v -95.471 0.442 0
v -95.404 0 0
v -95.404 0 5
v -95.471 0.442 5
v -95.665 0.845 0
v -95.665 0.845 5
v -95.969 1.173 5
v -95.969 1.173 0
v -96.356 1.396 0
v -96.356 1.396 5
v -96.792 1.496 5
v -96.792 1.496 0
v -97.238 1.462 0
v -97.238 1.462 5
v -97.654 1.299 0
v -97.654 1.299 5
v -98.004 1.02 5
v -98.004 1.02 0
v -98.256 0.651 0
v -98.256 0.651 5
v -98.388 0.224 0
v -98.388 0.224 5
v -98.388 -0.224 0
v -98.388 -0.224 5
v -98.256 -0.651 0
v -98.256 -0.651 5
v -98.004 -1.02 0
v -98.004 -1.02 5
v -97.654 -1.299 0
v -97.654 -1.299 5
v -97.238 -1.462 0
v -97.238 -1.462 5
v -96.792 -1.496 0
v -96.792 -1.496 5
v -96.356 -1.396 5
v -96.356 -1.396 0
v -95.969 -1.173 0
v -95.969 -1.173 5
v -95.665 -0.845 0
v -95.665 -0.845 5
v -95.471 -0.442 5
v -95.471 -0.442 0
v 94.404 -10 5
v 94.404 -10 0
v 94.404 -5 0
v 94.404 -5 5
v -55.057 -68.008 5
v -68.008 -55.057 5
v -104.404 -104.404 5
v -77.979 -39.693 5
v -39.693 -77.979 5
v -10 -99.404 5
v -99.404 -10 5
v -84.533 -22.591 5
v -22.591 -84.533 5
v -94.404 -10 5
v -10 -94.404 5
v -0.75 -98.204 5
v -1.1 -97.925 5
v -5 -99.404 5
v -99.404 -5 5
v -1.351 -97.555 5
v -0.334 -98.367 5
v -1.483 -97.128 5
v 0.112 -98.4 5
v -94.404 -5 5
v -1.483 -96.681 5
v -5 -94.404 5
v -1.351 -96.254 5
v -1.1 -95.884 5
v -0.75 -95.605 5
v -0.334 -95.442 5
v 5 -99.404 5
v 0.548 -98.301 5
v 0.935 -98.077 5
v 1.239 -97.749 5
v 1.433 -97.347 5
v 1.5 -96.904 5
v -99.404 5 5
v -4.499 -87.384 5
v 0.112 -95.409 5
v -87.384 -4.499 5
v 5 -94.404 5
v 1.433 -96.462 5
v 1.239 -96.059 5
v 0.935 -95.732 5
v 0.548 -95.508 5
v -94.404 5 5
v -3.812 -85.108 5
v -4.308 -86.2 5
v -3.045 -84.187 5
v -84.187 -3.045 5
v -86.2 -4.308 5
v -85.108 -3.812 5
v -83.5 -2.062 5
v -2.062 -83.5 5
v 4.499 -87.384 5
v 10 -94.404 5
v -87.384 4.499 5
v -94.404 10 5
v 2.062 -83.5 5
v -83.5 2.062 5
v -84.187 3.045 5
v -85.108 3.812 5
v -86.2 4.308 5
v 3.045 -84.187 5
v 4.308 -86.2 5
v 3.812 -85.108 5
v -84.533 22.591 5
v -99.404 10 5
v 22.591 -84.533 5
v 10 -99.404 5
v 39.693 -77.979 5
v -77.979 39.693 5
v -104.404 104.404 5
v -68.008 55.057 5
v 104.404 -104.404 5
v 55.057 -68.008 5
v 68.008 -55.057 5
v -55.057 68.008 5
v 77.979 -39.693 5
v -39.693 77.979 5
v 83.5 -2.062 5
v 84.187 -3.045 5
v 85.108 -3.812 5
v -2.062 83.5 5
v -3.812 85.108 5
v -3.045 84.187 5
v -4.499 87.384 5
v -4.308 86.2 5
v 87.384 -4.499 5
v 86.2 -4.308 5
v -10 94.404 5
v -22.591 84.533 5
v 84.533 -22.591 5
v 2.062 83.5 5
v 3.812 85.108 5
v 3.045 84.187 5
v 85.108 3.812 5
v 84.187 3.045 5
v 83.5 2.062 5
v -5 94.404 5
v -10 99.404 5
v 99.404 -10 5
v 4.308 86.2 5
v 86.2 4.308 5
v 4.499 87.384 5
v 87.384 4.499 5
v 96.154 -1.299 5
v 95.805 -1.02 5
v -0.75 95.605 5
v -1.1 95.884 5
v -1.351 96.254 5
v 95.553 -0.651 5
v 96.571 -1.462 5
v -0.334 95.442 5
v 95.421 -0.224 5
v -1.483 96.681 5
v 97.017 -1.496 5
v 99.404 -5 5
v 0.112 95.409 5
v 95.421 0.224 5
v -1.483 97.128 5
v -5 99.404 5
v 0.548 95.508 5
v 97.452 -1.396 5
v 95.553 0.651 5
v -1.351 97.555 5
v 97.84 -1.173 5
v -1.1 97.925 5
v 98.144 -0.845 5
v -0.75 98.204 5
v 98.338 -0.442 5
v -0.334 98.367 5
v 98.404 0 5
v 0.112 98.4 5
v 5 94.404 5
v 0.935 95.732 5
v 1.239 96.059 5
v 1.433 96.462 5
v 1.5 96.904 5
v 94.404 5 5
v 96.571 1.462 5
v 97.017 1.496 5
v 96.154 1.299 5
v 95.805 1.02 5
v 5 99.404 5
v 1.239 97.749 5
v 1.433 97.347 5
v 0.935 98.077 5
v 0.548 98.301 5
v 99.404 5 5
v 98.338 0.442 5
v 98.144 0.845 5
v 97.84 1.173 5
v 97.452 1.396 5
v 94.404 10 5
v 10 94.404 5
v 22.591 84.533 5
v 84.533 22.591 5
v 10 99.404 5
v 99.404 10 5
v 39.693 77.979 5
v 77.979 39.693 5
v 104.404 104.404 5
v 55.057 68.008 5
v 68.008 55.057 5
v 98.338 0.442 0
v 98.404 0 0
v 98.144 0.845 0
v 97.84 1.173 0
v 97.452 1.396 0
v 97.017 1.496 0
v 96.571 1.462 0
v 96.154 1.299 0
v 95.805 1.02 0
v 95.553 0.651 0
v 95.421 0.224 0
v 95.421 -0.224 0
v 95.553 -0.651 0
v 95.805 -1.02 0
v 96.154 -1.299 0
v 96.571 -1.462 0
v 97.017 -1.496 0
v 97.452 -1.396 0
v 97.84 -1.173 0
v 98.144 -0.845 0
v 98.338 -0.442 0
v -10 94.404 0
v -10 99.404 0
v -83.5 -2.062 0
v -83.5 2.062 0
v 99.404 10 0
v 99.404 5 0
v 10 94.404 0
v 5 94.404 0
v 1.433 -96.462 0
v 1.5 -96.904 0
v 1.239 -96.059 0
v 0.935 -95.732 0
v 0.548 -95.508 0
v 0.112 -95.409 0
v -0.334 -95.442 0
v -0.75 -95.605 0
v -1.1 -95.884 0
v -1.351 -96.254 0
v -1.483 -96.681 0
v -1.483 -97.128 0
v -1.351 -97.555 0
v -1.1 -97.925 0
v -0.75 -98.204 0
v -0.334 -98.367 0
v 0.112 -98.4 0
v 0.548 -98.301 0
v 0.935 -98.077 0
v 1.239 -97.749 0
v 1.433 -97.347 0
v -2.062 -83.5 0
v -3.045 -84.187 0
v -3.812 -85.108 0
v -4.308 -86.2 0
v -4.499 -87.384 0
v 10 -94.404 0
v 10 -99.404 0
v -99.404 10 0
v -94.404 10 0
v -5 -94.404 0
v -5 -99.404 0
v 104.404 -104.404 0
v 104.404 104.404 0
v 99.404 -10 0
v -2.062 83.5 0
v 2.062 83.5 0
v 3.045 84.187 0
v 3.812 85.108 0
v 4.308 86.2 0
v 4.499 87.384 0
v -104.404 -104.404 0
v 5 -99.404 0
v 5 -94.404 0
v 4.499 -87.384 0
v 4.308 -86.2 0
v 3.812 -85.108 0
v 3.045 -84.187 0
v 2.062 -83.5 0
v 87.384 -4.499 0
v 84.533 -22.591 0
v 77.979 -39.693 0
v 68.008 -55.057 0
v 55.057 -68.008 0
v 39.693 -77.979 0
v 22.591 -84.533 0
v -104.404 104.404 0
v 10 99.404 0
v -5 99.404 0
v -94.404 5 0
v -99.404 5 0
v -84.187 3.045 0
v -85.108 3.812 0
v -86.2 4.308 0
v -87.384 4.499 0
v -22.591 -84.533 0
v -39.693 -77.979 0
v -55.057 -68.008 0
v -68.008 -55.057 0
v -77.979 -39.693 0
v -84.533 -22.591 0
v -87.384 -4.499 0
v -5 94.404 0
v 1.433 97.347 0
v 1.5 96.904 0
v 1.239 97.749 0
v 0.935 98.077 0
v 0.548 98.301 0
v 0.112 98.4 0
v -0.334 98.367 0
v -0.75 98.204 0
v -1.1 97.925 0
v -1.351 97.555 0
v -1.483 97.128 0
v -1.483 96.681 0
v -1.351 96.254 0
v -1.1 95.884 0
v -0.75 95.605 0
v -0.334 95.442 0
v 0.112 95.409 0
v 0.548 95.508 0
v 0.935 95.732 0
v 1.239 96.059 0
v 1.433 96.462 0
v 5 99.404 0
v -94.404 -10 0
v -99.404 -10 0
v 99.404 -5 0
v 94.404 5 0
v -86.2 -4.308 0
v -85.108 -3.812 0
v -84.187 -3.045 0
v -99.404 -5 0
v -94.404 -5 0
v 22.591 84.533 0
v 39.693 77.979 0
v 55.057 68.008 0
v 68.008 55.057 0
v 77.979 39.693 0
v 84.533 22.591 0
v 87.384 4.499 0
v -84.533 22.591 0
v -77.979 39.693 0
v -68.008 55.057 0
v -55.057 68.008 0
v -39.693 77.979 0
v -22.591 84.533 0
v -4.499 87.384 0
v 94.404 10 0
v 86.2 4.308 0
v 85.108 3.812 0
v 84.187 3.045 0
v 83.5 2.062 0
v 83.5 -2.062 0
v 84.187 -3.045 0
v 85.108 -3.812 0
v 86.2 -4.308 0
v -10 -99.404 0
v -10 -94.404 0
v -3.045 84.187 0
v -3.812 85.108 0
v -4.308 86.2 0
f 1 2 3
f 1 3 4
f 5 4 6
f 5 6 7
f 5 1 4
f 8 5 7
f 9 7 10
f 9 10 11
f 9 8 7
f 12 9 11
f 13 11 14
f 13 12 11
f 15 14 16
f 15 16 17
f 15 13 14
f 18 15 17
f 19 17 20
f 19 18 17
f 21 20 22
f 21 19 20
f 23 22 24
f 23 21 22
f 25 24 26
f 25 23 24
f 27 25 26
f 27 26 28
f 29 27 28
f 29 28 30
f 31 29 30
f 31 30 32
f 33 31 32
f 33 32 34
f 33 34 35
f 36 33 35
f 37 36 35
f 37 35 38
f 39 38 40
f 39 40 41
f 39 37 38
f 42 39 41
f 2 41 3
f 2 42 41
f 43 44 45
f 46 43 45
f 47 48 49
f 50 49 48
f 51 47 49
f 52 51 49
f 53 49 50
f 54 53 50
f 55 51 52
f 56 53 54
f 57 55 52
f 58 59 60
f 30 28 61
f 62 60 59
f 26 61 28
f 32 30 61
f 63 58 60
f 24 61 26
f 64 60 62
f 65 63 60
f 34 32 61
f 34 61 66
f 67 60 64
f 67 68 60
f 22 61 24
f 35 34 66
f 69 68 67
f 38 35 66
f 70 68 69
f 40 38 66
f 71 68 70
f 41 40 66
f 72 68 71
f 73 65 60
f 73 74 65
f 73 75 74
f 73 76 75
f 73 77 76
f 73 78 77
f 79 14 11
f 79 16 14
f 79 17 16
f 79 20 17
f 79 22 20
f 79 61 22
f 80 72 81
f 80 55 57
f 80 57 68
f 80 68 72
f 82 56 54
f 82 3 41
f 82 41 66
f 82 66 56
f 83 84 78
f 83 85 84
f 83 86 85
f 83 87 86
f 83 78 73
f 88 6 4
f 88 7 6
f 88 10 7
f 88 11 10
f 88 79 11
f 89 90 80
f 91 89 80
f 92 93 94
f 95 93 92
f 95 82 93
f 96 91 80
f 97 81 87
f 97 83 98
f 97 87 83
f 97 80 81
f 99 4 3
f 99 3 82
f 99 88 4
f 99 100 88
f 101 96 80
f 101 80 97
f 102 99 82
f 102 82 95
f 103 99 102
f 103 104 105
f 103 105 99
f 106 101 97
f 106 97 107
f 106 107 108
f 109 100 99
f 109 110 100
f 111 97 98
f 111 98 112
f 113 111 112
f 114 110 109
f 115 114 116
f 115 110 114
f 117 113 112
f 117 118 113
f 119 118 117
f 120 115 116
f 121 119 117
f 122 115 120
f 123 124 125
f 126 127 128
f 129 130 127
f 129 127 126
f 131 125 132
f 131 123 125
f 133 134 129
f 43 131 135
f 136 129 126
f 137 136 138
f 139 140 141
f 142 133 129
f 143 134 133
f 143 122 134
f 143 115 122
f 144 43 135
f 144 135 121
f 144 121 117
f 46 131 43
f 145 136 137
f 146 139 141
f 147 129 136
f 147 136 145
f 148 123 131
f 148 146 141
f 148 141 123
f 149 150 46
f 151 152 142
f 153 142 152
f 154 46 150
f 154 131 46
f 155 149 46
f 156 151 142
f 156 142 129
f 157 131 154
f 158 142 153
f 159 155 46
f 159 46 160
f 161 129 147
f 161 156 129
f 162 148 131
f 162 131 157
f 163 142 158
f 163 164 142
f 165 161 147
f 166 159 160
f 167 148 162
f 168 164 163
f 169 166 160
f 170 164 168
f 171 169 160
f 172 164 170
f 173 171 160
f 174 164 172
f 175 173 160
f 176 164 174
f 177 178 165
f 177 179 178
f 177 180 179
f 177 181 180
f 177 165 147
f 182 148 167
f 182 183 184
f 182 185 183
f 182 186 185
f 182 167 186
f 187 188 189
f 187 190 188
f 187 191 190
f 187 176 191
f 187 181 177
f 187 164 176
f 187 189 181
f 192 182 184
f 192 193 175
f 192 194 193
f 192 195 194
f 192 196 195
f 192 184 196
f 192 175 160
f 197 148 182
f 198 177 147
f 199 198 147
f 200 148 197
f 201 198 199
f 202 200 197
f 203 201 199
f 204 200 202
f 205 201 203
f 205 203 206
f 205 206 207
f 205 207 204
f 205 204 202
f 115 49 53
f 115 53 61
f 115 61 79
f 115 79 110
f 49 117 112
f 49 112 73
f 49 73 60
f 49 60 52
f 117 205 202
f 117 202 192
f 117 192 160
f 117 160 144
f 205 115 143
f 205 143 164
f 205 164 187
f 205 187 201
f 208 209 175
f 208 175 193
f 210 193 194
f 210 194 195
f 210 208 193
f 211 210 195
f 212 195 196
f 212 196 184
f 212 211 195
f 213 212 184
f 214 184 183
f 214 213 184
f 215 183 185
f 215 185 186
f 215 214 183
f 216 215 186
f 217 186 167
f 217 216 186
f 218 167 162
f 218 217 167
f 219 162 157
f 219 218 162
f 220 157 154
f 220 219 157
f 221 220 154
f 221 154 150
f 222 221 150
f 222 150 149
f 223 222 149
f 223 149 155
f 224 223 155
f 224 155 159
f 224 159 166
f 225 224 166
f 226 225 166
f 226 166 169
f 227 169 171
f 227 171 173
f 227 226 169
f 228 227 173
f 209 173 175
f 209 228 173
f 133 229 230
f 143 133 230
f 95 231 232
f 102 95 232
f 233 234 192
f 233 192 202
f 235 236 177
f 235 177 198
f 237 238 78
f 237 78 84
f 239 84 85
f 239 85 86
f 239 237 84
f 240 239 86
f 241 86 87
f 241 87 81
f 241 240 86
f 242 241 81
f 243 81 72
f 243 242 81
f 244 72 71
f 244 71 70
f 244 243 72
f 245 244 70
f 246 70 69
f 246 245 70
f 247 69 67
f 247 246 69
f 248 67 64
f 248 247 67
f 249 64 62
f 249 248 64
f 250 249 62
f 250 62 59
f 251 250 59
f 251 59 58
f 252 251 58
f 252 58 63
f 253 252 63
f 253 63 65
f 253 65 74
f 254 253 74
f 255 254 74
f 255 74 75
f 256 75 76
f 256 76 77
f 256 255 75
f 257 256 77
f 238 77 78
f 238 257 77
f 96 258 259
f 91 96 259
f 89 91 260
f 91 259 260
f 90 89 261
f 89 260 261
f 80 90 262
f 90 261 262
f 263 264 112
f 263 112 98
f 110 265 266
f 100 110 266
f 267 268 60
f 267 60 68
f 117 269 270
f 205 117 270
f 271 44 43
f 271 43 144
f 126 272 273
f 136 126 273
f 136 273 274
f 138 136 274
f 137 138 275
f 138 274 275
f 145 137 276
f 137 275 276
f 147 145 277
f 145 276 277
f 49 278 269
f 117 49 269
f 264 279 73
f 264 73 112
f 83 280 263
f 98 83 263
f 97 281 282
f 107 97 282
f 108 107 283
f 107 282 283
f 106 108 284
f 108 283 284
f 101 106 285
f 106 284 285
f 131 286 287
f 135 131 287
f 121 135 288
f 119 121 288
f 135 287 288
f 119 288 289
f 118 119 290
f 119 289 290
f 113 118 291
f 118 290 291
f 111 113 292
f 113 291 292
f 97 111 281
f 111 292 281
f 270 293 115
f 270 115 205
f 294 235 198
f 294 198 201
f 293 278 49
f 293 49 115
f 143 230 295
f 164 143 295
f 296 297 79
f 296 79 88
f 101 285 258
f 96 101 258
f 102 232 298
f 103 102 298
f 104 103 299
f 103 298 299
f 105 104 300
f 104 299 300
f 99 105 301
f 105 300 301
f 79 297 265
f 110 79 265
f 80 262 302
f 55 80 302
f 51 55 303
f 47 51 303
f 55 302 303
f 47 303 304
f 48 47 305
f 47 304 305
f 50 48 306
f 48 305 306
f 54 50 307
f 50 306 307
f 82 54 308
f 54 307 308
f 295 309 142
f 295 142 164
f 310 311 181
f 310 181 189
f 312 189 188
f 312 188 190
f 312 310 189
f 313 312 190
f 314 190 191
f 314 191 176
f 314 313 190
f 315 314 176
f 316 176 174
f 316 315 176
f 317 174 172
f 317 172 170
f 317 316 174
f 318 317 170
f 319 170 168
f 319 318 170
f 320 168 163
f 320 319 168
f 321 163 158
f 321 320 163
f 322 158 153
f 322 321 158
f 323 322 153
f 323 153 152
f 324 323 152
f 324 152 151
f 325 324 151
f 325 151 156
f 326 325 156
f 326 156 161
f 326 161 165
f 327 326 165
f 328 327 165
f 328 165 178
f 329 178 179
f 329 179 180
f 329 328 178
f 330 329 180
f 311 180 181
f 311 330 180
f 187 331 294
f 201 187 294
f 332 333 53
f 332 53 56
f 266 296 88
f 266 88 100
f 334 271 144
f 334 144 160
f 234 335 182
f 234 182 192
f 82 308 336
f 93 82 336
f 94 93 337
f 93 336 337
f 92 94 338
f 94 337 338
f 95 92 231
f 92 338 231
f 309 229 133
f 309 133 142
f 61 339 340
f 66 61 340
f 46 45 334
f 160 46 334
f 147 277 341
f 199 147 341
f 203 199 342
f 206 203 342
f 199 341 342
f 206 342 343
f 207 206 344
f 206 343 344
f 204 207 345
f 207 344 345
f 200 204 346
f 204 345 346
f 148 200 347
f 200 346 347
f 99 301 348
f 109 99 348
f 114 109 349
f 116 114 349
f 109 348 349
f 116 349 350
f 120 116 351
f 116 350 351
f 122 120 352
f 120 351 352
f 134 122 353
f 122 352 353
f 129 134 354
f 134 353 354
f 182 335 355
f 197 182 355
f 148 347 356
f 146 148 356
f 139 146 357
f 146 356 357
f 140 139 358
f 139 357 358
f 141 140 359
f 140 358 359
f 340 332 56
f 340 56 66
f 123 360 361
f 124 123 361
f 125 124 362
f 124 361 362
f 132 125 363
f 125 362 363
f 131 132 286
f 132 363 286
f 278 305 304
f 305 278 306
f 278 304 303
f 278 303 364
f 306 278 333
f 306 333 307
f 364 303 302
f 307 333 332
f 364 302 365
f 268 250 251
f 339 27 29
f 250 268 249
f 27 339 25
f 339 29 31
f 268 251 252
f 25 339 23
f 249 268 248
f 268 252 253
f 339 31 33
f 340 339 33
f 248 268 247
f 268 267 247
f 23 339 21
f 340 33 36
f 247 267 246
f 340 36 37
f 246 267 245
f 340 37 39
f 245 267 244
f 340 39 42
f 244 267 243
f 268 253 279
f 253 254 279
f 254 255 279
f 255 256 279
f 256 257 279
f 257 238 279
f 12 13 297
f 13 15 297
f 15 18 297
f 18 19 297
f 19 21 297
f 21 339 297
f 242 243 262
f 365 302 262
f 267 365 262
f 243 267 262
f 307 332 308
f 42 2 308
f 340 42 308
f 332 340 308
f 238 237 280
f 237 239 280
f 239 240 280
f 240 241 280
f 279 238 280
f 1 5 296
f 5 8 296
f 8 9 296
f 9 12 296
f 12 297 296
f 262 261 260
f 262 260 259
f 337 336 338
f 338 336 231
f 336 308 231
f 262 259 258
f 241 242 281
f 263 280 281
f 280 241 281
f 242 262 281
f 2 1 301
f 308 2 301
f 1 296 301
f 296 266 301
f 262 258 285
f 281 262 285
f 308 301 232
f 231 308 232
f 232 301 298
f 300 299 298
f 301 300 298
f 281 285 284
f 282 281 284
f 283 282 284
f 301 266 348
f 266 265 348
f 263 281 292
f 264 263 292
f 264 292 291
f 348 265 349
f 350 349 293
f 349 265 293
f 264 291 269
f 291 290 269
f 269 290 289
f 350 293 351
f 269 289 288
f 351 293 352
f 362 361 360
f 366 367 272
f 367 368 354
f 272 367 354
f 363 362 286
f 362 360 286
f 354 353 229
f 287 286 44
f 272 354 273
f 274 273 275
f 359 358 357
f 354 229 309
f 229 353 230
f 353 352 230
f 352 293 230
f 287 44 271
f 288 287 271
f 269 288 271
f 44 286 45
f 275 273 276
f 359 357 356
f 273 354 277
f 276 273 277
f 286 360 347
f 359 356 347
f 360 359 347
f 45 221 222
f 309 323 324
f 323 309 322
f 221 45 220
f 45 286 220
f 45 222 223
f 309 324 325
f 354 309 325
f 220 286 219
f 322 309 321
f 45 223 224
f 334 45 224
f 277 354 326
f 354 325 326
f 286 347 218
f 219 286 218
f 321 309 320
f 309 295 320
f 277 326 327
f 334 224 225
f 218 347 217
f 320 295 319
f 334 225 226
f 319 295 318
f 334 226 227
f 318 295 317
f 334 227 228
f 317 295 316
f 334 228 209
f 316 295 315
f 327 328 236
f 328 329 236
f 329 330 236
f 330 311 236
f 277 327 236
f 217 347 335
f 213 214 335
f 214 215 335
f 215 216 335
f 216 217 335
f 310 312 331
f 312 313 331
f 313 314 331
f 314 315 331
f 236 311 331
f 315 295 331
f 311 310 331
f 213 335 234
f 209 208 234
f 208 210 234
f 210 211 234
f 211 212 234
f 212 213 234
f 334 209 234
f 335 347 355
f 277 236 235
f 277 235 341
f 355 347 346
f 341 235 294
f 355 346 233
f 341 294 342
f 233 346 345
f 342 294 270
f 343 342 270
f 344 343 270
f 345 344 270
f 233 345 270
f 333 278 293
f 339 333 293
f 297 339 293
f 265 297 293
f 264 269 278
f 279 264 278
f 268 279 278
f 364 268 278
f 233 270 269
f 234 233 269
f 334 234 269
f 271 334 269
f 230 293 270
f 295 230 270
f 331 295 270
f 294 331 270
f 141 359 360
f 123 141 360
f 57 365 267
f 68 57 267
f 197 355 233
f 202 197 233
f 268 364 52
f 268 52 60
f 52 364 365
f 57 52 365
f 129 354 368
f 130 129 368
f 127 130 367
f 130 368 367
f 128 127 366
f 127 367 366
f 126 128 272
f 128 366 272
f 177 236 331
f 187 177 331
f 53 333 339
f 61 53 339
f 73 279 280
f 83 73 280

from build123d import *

# Parameters (mm, degrees)
BOSS_EXTRU_1_DEPTH = 5
BOSS_EXTRU_2_START = -5
ESQUISSE2_W        = 208.80895352
ESQUISSE2_H        = 208.80895352
ESQUISSE2_R        = 87.5
ESQUISSE2_R_2      = 1.5
ESQUISSE2_W_2      = 5
ESQUISSE2_H_2      = 5
BOSS_EXTRU_2_DEPTH = 5


# Read off the part's stored shape, not the designer's step: Boss.-Extru.1
with BuildPart() as part:
    # Boss.-Extru.1 outline → Boss.-Extru.1 (new body)
    with BuildSketch(Plane.XY):
        with BuildLine():
            Line((-15, 94.40447676), (-15, 99.40447676))
            Line((-15, 99.40447676), (-25, 99.40447676))
            ThreePointArc((-25, 99.40447676), (-72.478445072, 72.478445072), (-99.40447676, 25))
            Line((-99.40447676, 25), (-99.40447676, 15))
            Line((-99.40447676, 15), (-94.40447676, 15))
            Line((-94.40447676, 15), (-94.40447676, -15))
            Line((-94.40447676, -15), (-99.40447676, -15))
            Line((-99.40447676, -15), (-99.40447676, -25))
            ThreePointArc((-99.40447676, -25), (-72.478445072, -72.478445072), (-25, -99.40447676))
            Line((-25, -99.40447676), (-15, -99.40447676))
            Line((-15, -99.40447676), (-15, -94.40447676))
            Line((-15, -94.40447676), (15, -94.40447676))
            Line((15, -94.40447676), (15, -99.40447676))
            Line((15, -99.40447676), (25, -99.40447676))
            ThreePointArc((25, -99.40447676), (72.478445072, -72.478445072), (99.40447676, -25))
            Line((99.40447676, -25), (99.40447676, -15))
            Line((99.40447676, -15), (94.40447676, -15))
            Line((94.40447676, -15), (94.40447676, 15))
            Line((94.40447676, 15), (99.40447676, 15))
            Line((99.40447676, 15), (99.40447676, 25))
            ThreePointArc((99.40447676, 25), (72.478445072, 72.478445072), (25, 99.40447676))
            Line((25, 99.40447676), (15, 99.40447676))
            Line((15, 99.40447676), (15, 94.40447676))
            Line((15, 94.40447676), (-15, 94.40447676))
        make_face()
        with BuildLine():
            ThreePointArc((-2.061552813, -83.5), (-3.811893422, -85.108458961), (-4.498511999, -87.384285714))
            ThreePointArc((-4.498511999, -87.384285714), (-61.871843354, -61.871843354), (-87.384285714, -4.498511999))
            ThreePointArc((-87.384285714, -4.498511999), (-85.108458961, -3.811893422), (-83.5, -2.061552813))
            Line((-83.5, -2.061552813), (-83.5, 2.061552813))
            ThreePointArc((-83.5, 2.061552813), (-85.108458961, 3.811893422), (-87.384285714, 4.498511999))
            ThreePointArc((-87.384285714, 4.498511999), (-61.871843354, 61.871843354), (-4.498511999, 87.384285714))
            ThreePointArc((-4.498511999, 87.384285714), (-3.811893422, 85.108458961), (-2.061552813, 83.5))
            Line((-2.061552813, 83.5), (2.061552813, 83.5))
            ThreePointArc((2.061552813, 83.5), (3.811893422, 85.108458961), (4.498511999, 87.384285714))
            ThreePointArc((4.498511999, 87.384285714), (61.871843354, 61.871843354), (87.384285714, 4.498511999))
            ThreePointArc((87.384285714, 4.498511999), (85.108458961, 3.811893422), (83.5, 2.061552813))
            Line((83.5, 2.061552813), (83.5, -2.061552813))
            ThreePointArc((83.5, -2.061552813), (85.108458961, -3.811893422), (87.384285714, -4.498511999))
            ThreePointArc((87.384285714, -4.498511999), (61.871843354, -61.871843354), (4.498511999, -87.384285714))
            ThreePointArc((4.498511999, -87.384285714), (3.811893422, -85.108458961), (2.061552813, -83.5))
            Line((2.061552813, -83.5), (-2.061552813, -83.5))
        make_face(mode=Mode.SUBTRACT)
    extrude(amount=BOSS_EXTRU_1_DEPTH)

    # Esquisse2 → Boss.-Extru.2 (add)
    with BuildSketch(Plane.XY.offset(5).offset(BOSS_EXTRU_2_START)):
        Rectangle(ESQUISSE2_W, ESQUISSE2_H)
        Circle(ESQUISSE2_R, mode=Mode.SUBTRACT)
        with Locations((0, 96.90447676)):
            Circle(ESQUISSE2_R_2, mode=Mode.SUBTRACT)
        with Locations((96.90447676, 0)):
            Circle(ESQUISSE2_R_2, mode=Mode.SUBTRACT)
        with Locations((0, -96.90447676)):
            Circle(ESQUISSE2_R_2, mode=Mode.SUBTRACT)
        with Locations((-96.90447676, 0)):
            Circle(ESQUISSE2_R_2, mode=Mode.SUBTRACT)
        with Locations((-7.5, 96.90447676)):
            Rectangle(ESQUISSE2_W_2, ESQUISSE2_H_2, mode=Mode.SUBTRACT)
        with Locations((7.5, 96.90447676)):
            Rectangle(ESQUISSE2_W_2, ESQUISSE2_H_2, mode=Mode.SUBTRACT)
        with Locations((96.90447676, 7.5)):
            Rectangle(ESQUISSE2_W_2, ESQUISSE2_H_2, mode=Mode.SUBTRACT)
        with Locations((96.90447676, -7.5)):
            Rectangle(ESQUISSE2_W_2, ESQUISSE2_H_2, mode=Mode.SUBTRACT)
        with Locations((7.5, -96.90447676)):
            Rectangle(ESQUISSE2_W_2, ESQUISSE2_H_2, mode=Mode.SUBTRACT)
        with Locations((-7.5, -96.90447676)):
            Rectangle(ESQUISSE2_W_2, ESQUISSE2_H_2, mode=Mode.SUBTRACT)
        with Locations((-96.90447676, -7.5)):
            Rectangle(ESQUISSE2_W_2, ESQUISSE2_H_2, mode=Mode.SUBTRACT)
        with Locations((-96.90447676, 7.5)):
            Rectangle(ESQUISSE2_W_2, ESQUISSE2_H_2, mode=Mode.SUBTRACT)
    extrude(amount=BOSS_EXTRU_2_DEPTH)


solid = part.part
